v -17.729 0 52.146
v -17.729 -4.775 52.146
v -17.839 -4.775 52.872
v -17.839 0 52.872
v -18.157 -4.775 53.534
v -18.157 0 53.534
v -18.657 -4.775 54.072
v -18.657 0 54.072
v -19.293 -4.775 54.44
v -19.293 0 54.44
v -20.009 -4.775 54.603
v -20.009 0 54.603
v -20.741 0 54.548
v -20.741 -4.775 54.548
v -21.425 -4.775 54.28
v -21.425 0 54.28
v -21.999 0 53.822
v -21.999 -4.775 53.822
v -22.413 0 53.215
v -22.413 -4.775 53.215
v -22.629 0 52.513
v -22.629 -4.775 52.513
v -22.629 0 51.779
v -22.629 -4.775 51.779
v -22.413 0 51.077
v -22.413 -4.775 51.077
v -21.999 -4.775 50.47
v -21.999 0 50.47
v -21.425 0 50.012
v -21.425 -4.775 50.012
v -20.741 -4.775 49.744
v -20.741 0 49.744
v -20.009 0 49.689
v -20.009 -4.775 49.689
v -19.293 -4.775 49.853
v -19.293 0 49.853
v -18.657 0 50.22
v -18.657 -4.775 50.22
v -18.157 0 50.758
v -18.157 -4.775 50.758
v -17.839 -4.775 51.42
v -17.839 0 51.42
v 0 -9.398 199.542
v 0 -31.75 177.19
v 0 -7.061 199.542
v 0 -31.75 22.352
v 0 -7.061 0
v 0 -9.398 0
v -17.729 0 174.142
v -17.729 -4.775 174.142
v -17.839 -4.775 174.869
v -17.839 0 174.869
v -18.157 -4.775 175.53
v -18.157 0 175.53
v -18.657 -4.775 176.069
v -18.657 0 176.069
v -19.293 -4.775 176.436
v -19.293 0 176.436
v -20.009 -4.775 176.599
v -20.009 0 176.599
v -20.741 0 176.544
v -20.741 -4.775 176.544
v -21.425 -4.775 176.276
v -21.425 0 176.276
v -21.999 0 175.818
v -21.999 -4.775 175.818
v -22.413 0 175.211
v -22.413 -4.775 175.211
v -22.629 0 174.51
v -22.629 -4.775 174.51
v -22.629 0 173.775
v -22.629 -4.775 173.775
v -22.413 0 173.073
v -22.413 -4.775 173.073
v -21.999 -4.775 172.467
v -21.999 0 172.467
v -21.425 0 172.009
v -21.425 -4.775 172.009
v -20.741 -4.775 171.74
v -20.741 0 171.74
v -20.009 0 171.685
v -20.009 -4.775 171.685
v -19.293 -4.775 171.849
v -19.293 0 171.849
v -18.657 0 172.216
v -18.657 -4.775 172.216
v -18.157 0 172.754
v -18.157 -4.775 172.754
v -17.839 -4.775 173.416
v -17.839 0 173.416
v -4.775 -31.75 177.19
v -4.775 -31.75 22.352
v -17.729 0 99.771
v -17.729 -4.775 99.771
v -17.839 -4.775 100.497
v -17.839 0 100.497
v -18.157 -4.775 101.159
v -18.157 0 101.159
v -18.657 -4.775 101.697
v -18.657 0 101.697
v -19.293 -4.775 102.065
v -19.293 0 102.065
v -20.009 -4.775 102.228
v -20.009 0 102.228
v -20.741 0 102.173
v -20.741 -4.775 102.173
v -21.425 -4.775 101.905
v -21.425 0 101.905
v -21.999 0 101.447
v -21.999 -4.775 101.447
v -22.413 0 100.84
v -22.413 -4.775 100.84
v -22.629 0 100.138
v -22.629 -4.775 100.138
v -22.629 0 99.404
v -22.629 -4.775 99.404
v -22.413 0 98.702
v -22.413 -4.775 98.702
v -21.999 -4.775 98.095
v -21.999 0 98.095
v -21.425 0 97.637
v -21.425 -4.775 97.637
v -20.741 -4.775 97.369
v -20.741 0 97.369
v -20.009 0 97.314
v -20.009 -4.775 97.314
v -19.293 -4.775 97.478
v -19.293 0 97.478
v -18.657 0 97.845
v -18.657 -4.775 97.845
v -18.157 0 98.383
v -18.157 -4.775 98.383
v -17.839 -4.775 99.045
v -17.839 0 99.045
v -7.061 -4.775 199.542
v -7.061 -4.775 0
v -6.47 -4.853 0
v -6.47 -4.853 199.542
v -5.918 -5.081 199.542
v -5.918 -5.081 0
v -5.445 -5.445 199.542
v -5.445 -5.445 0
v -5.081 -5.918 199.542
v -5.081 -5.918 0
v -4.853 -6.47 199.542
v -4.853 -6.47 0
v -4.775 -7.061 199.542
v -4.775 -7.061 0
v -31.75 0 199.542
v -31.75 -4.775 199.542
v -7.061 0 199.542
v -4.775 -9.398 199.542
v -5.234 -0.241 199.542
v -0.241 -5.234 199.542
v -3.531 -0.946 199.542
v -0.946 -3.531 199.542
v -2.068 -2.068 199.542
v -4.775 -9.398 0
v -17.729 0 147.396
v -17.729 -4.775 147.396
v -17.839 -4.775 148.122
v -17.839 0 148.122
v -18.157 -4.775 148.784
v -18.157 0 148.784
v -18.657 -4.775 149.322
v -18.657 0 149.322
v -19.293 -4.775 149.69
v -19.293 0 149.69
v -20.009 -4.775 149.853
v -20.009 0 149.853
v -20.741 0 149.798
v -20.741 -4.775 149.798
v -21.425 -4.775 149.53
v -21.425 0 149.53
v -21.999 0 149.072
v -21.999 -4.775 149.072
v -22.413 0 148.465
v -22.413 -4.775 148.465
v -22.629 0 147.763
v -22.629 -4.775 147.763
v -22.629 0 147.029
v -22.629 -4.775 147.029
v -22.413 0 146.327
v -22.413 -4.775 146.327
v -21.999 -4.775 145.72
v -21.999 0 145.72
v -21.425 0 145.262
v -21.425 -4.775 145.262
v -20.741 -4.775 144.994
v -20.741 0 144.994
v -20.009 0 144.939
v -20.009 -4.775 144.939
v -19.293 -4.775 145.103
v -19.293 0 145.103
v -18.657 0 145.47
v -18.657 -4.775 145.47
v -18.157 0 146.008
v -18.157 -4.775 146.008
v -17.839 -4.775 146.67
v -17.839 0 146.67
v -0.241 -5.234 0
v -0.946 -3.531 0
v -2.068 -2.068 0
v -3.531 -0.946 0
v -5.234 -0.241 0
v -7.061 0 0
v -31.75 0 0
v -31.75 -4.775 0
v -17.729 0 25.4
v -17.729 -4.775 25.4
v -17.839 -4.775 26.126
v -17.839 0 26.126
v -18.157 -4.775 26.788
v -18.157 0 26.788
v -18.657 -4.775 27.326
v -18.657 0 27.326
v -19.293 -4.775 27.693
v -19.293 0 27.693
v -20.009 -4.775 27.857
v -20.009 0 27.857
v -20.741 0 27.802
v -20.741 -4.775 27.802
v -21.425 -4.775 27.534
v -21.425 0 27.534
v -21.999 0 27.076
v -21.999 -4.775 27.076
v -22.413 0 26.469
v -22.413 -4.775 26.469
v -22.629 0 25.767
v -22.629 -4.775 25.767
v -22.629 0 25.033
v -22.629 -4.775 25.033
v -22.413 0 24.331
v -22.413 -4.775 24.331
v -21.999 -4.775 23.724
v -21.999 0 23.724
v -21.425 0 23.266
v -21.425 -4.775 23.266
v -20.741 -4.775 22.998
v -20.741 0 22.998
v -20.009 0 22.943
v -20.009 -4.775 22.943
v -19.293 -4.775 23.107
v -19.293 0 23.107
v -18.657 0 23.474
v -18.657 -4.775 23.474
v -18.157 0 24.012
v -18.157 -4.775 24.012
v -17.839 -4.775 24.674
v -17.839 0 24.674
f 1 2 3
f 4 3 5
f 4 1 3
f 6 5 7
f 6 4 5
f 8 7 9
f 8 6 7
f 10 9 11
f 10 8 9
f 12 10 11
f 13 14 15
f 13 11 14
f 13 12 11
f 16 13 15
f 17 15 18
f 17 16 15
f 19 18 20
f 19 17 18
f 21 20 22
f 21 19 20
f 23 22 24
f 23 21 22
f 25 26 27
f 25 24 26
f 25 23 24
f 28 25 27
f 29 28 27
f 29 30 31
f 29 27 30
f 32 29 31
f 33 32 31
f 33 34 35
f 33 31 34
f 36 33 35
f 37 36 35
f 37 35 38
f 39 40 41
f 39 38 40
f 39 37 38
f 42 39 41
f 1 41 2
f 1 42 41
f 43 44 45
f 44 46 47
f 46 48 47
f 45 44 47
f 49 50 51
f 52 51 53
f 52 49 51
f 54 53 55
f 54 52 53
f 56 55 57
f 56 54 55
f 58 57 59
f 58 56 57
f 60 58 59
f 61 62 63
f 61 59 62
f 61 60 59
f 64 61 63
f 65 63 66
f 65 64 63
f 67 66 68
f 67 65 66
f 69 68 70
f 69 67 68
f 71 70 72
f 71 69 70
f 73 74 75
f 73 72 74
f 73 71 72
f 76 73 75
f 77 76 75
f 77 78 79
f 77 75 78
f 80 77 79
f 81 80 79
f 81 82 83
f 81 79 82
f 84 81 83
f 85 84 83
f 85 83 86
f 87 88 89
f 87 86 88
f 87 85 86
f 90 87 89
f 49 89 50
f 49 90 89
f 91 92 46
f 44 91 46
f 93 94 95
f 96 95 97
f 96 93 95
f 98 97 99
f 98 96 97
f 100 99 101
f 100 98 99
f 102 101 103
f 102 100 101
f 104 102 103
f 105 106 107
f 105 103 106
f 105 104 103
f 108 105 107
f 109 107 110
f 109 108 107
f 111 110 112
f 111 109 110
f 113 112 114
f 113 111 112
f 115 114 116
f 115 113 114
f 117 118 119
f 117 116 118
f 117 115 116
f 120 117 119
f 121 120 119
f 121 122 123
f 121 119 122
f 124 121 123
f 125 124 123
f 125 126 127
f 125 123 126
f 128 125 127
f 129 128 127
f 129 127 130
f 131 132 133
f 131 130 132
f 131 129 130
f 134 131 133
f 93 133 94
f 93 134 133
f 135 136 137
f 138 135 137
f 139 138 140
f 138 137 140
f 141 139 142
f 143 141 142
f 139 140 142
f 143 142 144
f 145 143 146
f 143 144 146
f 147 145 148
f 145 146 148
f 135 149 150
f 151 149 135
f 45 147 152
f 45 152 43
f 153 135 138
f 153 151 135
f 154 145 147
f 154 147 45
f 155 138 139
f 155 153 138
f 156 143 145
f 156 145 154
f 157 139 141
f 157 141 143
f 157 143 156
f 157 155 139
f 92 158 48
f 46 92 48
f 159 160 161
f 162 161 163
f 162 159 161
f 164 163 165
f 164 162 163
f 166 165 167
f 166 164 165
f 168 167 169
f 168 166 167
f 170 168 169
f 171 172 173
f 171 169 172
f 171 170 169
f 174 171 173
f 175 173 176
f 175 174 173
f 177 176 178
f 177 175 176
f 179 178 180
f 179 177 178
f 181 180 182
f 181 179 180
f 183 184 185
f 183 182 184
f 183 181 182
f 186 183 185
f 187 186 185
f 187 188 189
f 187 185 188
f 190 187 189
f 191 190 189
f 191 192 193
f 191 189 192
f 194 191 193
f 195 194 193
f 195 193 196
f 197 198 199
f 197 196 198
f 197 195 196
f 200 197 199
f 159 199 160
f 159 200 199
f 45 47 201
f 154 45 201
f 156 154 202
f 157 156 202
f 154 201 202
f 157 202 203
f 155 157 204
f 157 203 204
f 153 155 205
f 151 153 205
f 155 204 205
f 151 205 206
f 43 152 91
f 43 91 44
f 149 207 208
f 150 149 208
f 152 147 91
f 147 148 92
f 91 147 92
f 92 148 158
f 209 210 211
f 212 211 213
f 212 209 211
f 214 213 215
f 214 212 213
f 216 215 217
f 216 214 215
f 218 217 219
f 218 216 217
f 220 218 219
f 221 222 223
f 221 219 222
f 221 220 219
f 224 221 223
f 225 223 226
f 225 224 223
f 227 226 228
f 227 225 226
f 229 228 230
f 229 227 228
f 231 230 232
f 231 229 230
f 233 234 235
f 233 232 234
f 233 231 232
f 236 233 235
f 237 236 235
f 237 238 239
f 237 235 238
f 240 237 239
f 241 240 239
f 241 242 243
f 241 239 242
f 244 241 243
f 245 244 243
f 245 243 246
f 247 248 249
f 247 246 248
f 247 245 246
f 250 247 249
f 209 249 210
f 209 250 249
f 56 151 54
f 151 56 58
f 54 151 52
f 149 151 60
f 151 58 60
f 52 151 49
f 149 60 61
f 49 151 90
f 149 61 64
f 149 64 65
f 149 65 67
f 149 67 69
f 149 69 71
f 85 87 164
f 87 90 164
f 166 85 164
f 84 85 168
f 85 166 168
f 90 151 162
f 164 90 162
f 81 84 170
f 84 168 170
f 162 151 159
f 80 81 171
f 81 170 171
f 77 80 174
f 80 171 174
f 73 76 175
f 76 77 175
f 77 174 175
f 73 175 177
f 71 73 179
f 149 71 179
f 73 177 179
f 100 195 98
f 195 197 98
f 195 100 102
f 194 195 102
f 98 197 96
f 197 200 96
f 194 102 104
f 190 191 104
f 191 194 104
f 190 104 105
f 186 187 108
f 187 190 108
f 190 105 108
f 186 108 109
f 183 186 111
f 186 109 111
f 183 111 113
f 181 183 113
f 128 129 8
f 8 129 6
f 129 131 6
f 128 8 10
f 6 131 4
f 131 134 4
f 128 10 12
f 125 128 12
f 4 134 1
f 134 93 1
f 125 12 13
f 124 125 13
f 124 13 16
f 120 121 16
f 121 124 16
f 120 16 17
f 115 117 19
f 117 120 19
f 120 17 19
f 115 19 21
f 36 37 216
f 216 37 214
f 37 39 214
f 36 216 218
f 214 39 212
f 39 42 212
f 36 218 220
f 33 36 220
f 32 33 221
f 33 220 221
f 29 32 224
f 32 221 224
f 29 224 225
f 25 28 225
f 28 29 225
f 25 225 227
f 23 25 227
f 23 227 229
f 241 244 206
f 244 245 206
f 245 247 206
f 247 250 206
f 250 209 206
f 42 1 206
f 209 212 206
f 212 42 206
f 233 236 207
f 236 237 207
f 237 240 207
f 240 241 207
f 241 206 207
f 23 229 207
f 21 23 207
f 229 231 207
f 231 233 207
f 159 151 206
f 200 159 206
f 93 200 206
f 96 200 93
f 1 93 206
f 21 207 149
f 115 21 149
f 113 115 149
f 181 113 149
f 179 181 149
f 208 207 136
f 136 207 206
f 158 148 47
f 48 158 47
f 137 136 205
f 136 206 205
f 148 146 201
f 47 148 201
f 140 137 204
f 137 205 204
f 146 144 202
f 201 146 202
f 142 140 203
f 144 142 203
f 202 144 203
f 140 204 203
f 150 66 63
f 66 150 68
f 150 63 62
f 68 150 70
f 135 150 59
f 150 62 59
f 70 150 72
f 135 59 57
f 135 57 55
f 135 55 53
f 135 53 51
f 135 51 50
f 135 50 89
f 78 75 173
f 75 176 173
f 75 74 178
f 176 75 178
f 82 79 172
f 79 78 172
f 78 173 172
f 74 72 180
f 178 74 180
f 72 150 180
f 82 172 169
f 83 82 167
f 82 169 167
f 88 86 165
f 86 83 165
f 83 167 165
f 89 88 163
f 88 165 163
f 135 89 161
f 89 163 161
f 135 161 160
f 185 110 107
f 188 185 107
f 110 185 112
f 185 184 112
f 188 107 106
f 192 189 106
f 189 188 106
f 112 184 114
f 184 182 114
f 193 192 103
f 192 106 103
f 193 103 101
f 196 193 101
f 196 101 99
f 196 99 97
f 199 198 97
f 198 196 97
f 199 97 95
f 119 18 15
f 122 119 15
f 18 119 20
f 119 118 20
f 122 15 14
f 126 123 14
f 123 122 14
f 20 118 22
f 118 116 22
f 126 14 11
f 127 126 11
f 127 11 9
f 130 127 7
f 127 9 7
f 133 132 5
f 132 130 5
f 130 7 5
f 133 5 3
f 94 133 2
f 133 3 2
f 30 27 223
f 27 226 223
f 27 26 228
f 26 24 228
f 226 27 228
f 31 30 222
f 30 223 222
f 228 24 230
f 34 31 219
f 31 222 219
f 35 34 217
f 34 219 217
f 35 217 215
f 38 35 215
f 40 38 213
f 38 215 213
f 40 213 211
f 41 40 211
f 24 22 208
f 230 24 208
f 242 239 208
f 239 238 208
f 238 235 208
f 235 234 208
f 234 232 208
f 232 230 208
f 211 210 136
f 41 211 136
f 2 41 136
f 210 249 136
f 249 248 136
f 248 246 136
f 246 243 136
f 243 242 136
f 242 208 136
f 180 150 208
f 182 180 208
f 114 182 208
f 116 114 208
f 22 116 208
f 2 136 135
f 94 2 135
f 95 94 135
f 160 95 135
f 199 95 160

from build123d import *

# Parameters (mm, degrees)
F1_DEPTH = 199.5424
F2_SIZE  = 22.352
F3_R     = 2.4638
F4_DEPTH = 25.4


with BuildPart() as f1:
    # F0 (on Top) → F1 (new body)
    with BuildSketch(Plane.XY):
        with BuildLine():
            Line((0, -31.75), (0, -7.0612))
            ThreePointArc((0, -7.0612), (-2.068178, -2.068178), (-7.0612, 0))
            Line((-7.0612, 0), (-31.75, 0))
            Line((-31.75, 0), (-31.75, -4.7752))
            Line((-31.75, -4.7752), (-7.0612, -4.7752))
            ThreePointArc((-7.0612, -4.7752), (-5.444754, -5.444754), (-4.7752, -7.0612))
            Line((-4.7752, -7.0612), (-4.7752, -31.75))
            Line((-4.7752, -31.75), (0, -31.75))
        make_face()
    extrude(amount=F1_DEPTH)

    # F2
    f2_edges = [f1.edges().sort_by_distance(p)[0] for p in [
        (-2.3876, -31.75, 199.5424),
        (-2.3876, -31.75, 0),
    ]]
    chamfer(f2_edges, length=F2_SIZE)

    # F3 (on Front) → F4 (cut)
    with BuildSketch(Plane.XZ):
        with Locations((-20.193, 174.1424)):
            Circle(F3_R)
        with Locations((-20.193, 99.7712)):
            Circle(F3_R)
        with Locations((-20.193, 25.4)):
            Circle(F3_R)
        with Locations((-20.193, 147.3962)):
            Circle(F3_R)
        with Locations((-20.193, 52.1462)):
            Circle(F3_R)
    extrude(amount=F4_DEPTH, mode=Mode.SUBTRACT)


solid = f1.part
